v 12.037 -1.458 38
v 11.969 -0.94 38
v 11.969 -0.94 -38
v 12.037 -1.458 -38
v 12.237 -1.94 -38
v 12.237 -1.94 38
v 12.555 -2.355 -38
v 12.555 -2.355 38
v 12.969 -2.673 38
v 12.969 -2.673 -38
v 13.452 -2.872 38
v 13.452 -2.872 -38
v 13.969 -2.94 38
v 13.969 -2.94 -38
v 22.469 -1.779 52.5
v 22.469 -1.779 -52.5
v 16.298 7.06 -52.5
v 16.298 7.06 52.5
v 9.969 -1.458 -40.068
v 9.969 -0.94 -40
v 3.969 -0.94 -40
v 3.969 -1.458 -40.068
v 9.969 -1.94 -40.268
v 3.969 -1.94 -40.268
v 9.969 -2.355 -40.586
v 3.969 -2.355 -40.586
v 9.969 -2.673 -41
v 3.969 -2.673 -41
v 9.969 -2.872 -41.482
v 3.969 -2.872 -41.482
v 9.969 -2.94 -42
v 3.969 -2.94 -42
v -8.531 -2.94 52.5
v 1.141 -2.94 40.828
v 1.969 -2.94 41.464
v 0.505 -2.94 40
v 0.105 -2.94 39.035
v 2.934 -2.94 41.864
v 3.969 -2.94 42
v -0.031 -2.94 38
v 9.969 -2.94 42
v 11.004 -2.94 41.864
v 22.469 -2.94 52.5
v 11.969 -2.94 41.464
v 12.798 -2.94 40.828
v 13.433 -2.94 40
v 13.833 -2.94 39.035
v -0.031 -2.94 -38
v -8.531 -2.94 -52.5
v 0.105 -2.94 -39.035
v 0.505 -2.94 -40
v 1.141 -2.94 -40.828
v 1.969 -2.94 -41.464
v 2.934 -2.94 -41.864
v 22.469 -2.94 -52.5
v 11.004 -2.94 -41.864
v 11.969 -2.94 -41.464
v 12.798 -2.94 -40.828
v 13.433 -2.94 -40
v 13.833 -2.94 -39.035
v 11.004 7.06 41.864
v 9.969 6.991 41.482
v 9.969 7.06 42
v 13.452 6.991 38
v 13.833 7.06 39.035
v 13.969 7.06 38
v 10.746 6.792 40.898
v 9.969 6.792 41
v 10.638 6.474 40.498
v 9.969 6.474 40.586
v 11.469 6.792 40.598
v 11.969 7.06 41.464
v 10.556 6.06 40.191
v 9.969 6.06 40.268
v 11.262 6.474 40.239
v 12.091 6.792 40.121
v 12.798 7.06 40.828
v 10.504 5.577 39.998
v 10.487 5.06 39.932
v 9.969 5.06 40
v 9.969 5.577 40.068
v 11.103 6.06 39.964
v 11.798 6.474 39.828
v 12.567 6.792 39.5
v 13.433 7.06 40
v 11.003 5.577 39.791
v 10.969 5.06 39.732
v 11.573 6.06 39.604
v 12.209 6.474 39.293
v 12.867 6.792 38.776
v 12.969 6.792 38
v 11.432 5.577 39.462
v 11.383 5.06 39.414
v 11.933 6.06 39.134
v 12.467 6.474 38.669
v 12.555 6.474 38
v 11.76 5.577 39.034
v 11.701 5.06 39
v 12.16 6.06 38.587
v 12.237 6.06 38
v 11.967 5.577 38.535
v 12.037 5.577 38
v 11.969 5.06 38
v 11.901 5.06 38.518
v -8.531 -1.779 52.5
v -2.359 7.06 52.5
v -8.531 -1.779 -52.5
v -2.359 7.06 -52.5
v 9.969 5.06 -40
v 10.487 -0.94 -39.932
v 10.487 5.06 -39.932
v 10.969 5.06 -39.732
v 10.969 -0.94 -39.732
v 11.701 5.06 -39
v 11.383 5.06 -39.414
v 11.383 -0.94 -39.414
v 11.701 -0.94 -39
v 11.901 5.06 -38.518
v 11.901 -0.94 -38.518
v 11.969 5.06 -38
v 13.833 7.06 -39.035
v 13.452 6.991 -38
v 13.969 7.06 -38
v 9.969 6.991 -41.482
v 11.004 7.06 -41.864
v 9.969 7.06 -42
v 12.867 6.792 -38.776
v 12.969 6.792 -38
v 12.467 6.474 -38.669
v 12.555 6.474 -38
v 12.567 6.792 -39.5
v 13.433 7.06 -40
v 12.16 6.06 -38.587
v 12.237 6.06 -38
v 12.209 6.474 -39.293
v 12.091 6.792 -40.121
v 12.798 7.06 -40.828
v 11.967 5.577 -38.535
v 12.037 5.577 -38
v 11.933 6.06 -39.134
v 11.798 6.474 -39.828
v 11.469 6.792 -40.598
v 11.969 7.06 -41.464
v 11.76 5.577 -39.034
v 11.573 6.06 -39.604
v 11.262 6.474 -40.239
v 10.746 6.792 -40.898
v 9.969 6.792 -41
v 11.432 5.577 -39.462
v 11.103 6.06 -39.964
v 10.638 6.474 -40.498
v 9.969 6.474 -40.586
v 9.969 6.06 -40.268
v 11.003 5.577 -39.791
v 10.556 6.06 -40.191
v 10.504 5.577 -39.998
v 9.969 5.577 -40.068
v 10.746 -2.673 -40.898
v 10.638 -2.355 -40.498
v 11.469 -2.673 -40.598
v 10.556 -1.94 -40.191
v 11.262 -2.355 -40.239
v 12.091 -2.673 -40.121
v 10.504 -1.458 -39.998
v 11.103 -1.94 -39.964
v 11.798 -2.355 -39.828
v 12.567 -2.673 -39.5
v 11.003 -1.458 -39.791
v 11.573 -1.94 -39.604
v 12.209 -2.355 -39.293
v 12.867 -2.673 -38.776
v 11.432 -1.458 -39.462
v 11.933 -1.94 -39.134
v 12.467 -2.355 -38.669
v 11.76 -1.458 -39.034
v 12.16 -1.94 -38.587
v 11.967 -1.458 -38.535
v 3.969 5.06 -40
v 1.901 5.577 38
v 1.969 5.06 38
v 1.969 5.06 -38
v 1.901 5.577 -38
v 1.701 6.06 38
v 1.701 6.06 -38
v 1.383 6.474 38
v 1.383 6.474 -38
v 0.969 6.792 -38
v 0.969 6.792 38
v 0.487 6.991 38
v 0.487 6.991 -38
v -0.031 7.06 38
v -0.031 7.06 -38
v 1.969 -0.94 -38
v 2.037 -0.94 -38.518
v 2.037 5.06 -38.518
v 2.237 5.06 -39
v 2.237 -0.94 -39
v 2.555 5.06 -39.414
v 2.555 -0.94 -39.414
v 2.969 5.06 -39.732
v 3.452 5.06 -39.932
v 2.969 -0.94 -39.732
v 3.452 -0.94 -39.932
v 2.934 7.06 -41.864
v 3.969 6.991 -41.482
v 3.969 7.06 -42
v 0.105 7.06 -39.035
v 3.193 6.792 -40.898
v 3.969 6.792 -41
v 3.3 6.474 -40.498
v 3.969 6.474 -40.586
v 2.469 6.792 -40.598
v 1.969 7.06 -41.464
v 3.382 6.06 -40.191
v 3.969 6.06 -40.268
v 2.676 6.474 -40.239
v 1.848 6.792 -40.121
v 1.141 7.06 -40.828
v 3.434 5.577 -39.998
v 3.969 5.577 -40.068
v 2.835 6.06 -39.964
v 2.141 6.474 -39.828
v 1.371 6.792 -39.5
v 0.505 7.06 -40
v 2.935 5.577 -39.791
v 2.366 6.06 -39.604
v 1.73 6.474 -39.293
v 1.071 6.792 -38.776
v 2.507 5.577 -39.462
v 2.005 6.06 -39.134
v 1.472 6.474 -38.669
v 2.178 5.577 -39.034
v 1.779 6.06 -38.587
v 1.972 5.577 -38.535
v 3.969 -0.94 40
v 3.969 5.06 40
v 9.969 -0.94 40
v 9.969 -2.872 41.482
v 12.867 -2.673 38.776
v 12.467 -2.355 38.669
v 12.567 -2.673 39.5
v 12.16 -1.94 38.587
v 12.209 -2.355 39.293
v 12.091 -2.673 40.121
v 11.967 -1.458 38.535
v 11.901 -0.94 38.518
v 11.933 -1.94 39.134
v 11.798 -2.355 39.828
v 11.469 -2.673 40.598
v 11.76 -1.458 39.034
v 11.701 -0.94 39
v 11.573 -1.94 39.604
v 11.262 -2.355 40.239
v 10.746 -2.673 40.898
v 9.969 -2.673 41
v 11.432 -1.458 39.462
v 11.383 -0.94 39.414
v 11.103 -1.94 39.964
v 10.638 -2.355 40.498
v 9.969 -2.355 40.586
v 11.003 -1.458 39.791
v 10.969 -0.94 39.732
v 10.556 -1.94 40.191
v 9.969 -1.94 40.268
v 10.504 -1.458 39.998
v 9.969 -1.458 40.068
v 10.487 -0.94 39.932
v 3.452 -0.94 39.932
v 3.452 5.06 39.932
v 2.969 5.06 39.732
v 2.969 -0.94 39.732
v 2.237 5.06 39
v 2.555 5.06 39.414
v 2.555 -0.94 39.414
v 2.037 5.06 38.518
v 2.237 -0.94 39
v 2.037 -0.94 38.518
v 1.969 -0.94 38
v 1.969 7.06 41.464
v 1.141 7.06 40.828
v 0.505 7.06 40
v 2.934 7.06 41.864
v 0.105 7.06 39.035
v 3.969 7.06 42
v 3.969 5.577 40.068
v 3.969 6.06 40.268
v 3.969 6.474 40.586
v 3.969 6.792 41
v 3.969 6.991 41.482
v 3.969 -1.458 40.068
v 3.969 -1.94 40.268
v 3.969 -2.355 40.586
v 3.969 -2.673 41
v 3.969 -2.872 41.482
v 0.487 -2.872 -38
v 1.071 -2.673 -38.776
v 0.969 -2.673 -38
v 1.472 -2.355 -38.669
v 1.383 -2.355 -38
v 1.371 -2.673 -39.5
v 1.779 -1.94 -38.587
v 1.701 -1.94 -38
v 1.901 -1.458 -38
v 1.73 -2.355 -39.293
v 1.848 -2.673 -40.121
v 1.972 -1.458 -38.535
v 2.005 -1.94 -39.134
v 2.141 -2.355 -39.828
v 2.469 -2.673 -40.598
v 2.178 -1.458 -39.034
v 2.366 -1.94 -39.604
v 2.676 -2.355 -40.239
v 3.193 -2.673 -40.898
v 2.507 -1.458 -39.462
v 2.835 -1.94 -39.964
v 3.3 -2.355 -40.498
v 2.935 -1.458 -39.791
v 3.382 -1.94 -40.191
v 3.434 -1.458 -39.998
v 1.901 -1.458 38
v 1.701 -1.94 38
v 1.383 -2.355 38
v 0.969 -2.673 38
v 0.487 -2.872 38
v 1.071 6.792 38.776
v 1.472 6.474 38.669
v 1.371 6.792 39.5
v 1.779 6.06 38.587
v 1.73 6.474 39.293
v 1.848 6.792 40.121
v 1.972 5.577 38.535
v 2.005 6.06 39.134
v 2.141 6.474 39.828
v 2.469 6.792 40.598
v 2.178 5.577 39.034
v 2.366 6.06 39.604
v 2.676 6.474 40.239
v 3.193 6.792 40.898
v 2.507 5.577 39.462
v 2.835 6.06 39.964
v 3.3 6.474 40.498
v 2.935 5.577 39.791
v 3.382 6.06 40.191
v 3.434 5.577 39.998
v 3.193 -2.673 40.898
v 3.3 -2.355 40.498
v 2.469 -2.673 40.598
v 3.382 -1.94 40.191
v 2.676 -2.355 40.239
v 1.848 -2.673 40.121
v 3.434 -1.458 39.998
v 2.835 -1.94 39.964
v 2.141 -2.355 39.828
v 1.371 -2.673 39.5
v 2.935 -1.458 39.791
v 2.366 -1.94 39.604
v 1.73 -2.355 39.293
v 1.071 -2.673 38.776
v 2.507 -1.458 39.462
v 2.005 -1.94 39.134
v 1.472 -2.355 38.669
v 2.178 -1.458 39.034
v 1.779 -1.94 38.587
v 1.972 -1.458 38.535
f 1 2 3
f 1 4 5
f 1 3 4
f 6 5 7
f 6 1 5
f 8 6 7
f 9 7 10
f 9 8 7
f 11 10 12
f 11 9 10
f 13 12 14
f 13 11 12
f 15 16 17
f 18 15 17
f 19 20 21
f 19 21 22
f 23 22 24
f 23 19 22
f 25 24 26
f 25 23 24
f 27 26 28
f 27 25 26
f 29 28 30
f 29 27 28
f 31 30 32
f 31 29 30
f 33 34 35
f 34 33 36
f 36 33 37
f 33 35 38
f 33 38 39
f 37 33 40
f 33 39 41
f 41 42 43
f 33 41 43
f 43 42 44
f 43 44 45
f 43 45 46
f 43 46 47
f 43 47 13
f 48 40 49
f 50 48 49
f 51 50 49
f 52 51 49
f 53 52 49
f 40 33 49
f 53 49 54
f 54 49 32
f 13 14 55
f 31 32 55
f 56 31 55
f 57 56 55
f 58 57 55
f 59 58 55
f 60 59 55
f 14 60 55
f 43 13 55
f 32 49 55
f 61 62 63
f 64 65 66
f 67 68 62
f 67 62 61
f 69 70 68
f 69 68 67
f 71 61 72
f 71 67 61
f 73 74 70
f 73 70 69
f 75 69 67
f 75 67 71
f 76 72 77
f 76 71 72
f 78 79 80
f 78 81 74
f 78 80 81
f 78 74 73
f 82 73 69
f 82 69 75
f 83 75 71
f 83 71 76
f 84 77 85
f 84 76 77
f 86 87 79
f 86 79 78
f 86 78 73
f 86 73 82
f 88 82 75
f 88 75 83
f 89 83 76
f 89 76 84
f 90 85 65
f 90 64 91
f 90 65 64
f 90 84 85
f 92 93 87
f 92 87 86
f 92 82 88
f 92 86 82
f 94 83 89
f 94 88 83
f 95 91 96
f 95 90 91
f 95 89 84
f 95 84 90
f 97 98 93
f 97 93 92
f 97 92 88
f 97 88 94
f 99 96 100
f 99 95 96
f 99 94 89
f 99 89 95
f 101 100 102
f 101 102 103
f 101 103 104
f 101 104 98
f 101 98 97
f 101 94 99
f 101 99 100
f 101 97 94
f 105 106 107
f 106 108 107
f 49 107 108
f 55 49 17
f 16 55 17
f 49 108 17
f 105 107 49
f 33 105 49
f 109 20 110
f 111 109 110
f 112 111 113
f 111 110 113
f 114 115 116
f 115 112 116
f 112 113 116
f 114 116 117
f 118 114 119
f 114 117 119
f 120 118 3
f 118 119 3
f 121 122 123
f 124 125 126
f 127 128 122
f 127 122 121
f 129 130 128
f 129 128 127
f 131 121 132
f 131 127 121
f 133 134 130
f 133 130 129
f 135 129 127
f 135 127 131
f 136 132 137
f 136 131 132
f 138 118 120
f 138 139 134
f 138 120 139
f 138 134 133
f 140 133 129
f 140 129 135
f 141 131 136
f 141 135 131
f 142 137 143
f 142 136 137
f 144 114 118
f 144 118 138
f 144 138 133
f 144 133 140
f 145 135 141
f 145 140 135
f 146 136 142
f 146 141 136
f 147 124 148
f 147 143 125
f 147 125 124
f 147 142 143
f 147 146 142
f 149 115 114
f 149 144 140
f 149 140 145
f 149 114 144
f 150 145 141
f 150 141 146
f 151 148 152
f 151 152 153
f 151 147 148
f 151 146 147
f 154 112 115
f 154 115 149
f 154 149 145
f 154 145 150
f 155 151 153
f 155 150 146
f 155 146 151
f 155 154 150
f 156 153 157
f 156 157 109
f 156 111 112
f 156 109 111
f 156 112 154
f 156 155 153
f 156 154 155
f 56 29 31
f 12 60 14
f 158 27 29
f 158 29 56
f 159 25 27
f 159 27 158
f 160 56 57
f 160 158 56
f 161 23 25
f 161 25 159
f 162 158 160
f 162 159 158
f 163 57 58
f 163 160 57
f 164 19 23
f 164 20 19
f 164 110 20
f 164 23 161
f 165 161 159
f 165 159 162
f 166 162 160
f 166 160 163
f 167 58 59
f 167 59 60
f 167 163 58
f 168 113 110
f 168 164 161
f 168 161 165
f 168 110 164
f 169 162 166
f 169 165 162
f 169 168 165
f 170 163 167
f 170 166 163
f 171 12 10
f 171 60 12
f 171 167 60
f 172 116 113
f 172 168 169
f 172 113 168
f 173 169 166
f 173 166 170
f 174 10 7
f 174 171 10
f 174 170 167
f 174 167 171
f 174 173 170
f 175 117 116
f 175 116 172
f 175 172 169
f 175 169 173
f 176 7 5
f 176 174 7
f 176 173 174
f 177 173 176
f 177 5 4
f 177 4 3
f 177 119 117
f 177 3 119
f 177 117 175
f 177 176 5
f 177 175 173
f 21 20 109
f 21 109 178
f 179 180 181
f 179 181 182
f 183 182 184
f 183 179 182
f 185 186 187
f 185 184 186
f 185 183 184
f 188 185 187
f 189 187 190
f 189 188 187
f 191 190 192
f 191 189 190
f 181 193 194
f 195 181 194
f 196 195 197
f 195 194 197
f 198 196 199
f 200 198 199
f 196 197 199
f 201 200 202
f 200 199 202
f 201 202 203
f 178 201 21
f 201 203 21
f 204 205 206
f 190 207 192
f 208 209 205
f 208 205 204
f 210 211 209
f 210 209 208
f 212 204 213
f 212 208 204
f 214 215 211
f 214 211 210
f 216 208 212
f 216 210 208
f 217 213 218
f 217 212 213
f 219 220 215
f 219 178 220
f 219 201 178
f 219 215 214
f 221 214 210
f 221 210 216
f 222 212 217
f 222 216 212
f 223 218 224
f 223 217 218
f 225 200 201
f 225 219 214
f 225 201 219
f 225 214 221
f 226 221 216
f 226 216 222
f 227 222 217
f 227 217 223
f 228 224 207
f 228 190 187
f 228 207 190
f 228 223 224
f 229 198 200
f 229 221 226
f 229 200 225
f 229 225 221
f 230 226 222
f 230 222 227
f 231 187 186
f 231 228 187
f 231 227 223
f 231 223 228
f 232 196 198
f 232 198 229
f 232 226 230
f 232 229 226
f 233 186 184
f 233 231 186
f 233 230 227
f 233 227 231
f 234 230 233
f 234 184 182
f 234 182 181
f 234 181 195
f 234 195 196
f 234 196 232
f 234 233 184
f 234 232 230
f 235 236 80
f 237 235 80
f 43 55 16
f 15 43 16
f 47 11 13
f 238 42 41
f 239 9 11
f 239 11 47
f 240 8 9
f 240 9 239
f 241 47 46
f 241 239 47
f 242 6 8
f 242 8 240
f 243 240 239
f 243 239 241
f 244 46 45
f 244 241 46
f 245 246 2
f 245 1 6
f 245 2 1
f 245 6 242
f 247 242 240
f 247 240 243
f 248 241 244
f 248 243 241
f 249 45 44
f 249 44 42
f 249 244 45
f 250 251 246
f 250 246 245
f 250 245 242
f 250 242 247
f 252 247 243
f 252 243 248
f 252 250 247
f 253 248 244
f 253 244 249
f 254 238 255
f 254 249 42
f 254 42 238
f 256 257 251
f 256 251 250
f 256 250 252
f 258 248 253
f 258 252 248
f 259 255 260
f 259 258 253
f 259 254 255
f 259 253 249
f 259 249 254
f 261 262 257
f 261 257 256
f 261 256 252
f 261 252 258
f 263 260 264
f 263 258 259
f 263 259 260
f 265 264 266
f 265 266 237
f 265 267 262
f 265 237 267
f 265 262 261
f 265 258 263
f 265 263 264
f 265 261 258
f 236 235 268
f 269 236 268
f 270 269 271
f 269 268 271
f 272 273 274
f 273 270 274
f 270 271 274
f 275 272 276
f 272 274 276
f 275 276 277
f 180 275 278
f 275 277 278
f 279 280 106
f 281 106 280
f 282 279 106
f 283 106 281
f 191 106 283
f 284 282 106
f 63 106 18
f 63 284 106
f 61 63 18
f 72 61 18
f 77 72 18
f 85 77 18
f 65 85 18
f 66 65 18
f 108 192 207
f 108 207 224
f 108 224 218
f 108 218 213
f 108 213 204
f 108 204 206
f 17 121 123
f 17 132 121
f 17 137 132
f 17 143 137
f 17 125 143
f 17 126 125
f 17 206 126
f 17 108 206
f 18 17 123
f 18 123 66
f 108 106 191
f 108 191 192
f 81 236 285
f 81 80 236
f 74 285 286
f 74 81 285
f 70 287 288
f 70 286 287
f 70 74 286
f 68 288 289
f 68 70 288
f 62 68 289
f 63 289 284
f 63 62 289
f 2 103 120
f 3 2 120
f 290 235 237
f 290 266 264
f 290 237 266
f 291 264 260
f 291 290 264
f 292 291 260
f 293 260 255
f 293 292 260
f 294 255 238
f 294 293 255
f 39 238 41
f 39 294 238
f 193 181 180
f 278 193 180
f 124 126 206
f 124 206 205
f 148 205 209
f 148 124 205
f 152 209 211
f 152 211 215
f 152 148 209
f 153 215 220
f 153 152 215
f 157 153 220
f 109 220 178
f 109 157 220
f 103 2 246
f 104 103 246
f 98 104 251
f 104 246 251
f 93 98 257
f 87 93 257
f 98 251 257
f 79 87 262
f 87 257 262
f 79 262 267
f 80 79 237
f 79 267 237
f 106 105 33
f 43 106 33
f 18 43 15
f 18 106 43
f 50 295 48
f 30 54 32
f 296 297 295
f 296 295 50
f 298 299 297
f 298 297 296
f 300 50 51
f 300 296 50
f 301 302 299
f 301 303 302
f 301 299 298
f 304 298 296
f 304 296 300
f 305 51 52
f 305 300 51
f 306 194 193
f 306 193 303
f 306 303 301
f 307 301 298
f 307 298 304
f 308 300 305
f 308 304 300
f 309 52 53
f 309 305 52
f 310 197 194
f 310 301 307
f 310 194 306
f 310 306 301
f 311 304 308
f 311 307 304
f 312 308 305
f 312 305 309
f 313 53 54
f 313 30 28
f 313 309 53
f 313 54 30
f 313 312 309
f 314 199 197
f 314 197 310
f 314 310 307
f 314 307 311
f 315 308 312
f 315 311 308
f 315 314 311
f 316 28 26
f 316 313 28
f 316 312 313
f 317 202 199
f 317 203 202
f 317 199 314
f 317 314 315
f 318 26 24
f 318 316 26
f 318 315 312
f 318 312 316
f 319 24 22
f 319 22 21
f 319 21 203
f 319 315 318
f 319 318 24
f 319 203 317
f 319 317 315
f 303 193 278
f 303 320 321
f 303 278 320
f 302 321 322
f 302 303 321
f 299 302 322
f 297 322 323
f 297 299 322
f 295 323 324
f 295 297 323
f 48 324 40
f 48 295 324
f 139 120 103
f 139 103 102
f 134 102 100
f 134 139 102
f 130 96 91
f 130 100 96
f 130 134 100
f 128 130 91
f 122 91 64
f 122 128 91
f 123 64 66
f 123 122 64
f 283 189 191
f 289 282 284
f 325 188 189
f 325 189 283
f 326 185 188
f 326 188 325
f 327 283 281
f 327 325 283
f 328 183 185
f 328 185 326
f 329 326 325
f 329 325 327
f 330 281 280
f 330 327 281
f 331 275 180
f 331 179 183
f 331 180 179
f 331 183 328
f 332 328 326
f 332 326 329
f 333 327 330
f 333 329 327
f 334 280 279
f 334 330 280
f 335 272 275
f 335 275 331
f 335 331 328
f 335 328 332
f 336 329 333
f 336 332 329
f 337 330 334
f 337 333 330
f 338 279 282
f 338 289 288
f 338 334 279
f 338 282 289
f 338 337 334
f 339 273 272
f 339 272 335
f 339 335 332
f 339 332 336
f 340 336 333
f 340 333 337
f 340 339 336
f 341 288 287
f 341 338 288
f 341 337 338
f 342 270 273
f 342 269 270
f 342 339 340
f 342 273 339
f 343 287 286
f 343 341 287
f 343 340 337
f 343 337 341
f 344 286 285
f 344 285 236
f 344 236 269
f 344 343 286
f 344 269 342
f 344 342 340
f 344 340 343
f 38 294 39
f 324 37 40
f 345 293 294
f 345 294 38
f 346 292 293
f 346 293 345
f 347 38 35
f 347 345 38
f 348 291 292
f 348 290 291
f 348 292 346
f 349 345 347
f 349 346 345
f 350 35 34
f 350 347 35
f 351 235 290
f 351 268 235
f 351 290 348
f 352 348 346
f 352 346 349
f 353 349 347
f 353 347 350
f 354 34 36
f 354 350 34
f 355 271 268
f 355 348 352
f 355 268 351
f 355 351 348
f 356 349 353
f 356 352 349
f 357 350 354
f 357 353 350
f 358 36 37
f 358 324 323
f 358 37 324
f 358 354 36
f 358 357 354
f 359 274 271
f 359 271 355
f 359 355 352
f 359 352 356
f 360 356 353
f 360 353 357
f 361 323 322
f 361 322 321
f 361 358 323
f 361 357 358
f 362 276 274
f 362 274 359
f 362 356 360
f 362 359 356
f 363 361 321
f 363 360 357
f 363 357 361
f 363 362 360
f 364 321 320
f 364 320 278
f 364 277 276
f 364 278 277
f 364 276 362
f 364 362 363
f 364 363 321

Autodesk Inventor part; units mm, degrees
ref_plane "YZ Plane" through (0, 0, 0) normal (1, 0, 0) x (0, 1, 0)
ref_plane "XZ Plane" through (0, 0, 0) normal (0, 1, 0) x (-1, 0, 0)
ref_plane "XY Plane" through (0, 0, 0) normal (0, 0, 1) x (1, 0, 0)
sketch "Schizzo1" plane through (0, 0, 0) normal (0, 0, 1) x (1, 0, 0)
  line L0 (-8.5308, -2.9405) -> (22.4692, -2.9405)
  line L1 (22.4692, -2.9405) -> (22.4692, -1.7792)
  line L2 (22.4692, -1.7792) -> (16.2975, 7.0595)
  line L3 (-2.3591, 7.0595) -> (-8.5308, -1.7792)
  line L4 (-8.5308, -1.7792) -> (-8.5308, -2.9405)
  line L5 (6.9692, 7.0595) -> (6.9692, -2.9405)
  line L6 (6.9692, 7.0595) -> (27.9692, 7.0595) construction
  line L7 (27.9692, 7.0595) -> (23.9692, 7.0595) construction
  line L8 (23.9692, 7.0595) -> (23.9692, 3.0595) construction
  circle A0 centre (23.9692, 3.0595) radius 4 construction
  line L9 (6.9692, 7.0595) -> (-14.0308, 7.0595) construction
  line L10 (-14.0308, 7.0595) -> (-10.0308, 7.0595) construction
  line L11 (-10.0308, 7.0595) -> (-10.0308, 3.0595) construction
  circle A1 centre (-10.0308, 3.0595) radius 4 construction
  line L12 (-2.3591, 7.0595) -> (16.2975, 7.0595)
  dimension "d1" = 31
  dimension "d6" = 10
  dimension "d7" = 21
  dimension "d8" = 4
  dimension "d9" = 4
  dimension "d10" = 10
  dimension "d11" = 21
  dimension "d12" = 4
  dimension "d13" = 4
extrude "Estrusione1" add sketch "Schizzo1" along normal mid plane 105
sketch "Schizzo3" plane through (-2.3591, 7.0595, 52.5) normal (0, 1, 0) x (1, 0, 0)
  line L0 (18.6566, 0) -> (0, 0) projected
  line L1 (0, 52.5) -> (18.6566, 52.5) construction
  line L2 (18.6566, 0) -> (18.6566, 105) projected
  line L3 (0, 0) -> (9.3283, 0)
  line L4 (9.3283, 0) -> (9.3283, 105) construction
  line L5 (24.8283, 105) -> (-6.1717, 105) projected
  line L6 (9.3283, 92.5) -> (4.3283, 92.5)
  line L7 (4.3283, 92.5) -> (4.3283, 12.5)
  line L8 (4.3283, 12.5) -> (14.3283, 12.5)
  line L9 (14.3283, 12.5) -> (14.3283, 92.5)
  line L10 (14.3283, 92.5) -> (9.3283, 92.5)
  point P0 (2.3591, 52.5)
  dimension "d18" = 5
  dimension "d19" = 80
  dimension "d20" = 10
extrude "Estrusione2" cut sketch "Schizzo3" against normal blind 10
fillet "Raccordo1" radius 2 8 edges at (11.9692, 2.0595, 40) (1.9692, 2.0595, 40) (1.9692, 2.0595, -40) (11.9692, 2.0595, -40) (11.9692, 7.0595, 0) (1.9692, 7.0595, 0) (6.9692, 7.0595, -40) (6.9692, 7.0595, 40)
fillet "Raccordo2" radius 2 8 edges at (11.3834, -2.9405, -39.4142) (6.9692, -2.9405, -40) (2.555, -2.9405, -39.4142) (1.9692, -2.9405, 0) (2.555, -2.9405, 39.4142) (6.9692, -2.9405, 40) (11.3834, -2.9405, 39.4142) (11.9692, -2.9405, 0)
properties part number "esercizio3 02-27-2023"
